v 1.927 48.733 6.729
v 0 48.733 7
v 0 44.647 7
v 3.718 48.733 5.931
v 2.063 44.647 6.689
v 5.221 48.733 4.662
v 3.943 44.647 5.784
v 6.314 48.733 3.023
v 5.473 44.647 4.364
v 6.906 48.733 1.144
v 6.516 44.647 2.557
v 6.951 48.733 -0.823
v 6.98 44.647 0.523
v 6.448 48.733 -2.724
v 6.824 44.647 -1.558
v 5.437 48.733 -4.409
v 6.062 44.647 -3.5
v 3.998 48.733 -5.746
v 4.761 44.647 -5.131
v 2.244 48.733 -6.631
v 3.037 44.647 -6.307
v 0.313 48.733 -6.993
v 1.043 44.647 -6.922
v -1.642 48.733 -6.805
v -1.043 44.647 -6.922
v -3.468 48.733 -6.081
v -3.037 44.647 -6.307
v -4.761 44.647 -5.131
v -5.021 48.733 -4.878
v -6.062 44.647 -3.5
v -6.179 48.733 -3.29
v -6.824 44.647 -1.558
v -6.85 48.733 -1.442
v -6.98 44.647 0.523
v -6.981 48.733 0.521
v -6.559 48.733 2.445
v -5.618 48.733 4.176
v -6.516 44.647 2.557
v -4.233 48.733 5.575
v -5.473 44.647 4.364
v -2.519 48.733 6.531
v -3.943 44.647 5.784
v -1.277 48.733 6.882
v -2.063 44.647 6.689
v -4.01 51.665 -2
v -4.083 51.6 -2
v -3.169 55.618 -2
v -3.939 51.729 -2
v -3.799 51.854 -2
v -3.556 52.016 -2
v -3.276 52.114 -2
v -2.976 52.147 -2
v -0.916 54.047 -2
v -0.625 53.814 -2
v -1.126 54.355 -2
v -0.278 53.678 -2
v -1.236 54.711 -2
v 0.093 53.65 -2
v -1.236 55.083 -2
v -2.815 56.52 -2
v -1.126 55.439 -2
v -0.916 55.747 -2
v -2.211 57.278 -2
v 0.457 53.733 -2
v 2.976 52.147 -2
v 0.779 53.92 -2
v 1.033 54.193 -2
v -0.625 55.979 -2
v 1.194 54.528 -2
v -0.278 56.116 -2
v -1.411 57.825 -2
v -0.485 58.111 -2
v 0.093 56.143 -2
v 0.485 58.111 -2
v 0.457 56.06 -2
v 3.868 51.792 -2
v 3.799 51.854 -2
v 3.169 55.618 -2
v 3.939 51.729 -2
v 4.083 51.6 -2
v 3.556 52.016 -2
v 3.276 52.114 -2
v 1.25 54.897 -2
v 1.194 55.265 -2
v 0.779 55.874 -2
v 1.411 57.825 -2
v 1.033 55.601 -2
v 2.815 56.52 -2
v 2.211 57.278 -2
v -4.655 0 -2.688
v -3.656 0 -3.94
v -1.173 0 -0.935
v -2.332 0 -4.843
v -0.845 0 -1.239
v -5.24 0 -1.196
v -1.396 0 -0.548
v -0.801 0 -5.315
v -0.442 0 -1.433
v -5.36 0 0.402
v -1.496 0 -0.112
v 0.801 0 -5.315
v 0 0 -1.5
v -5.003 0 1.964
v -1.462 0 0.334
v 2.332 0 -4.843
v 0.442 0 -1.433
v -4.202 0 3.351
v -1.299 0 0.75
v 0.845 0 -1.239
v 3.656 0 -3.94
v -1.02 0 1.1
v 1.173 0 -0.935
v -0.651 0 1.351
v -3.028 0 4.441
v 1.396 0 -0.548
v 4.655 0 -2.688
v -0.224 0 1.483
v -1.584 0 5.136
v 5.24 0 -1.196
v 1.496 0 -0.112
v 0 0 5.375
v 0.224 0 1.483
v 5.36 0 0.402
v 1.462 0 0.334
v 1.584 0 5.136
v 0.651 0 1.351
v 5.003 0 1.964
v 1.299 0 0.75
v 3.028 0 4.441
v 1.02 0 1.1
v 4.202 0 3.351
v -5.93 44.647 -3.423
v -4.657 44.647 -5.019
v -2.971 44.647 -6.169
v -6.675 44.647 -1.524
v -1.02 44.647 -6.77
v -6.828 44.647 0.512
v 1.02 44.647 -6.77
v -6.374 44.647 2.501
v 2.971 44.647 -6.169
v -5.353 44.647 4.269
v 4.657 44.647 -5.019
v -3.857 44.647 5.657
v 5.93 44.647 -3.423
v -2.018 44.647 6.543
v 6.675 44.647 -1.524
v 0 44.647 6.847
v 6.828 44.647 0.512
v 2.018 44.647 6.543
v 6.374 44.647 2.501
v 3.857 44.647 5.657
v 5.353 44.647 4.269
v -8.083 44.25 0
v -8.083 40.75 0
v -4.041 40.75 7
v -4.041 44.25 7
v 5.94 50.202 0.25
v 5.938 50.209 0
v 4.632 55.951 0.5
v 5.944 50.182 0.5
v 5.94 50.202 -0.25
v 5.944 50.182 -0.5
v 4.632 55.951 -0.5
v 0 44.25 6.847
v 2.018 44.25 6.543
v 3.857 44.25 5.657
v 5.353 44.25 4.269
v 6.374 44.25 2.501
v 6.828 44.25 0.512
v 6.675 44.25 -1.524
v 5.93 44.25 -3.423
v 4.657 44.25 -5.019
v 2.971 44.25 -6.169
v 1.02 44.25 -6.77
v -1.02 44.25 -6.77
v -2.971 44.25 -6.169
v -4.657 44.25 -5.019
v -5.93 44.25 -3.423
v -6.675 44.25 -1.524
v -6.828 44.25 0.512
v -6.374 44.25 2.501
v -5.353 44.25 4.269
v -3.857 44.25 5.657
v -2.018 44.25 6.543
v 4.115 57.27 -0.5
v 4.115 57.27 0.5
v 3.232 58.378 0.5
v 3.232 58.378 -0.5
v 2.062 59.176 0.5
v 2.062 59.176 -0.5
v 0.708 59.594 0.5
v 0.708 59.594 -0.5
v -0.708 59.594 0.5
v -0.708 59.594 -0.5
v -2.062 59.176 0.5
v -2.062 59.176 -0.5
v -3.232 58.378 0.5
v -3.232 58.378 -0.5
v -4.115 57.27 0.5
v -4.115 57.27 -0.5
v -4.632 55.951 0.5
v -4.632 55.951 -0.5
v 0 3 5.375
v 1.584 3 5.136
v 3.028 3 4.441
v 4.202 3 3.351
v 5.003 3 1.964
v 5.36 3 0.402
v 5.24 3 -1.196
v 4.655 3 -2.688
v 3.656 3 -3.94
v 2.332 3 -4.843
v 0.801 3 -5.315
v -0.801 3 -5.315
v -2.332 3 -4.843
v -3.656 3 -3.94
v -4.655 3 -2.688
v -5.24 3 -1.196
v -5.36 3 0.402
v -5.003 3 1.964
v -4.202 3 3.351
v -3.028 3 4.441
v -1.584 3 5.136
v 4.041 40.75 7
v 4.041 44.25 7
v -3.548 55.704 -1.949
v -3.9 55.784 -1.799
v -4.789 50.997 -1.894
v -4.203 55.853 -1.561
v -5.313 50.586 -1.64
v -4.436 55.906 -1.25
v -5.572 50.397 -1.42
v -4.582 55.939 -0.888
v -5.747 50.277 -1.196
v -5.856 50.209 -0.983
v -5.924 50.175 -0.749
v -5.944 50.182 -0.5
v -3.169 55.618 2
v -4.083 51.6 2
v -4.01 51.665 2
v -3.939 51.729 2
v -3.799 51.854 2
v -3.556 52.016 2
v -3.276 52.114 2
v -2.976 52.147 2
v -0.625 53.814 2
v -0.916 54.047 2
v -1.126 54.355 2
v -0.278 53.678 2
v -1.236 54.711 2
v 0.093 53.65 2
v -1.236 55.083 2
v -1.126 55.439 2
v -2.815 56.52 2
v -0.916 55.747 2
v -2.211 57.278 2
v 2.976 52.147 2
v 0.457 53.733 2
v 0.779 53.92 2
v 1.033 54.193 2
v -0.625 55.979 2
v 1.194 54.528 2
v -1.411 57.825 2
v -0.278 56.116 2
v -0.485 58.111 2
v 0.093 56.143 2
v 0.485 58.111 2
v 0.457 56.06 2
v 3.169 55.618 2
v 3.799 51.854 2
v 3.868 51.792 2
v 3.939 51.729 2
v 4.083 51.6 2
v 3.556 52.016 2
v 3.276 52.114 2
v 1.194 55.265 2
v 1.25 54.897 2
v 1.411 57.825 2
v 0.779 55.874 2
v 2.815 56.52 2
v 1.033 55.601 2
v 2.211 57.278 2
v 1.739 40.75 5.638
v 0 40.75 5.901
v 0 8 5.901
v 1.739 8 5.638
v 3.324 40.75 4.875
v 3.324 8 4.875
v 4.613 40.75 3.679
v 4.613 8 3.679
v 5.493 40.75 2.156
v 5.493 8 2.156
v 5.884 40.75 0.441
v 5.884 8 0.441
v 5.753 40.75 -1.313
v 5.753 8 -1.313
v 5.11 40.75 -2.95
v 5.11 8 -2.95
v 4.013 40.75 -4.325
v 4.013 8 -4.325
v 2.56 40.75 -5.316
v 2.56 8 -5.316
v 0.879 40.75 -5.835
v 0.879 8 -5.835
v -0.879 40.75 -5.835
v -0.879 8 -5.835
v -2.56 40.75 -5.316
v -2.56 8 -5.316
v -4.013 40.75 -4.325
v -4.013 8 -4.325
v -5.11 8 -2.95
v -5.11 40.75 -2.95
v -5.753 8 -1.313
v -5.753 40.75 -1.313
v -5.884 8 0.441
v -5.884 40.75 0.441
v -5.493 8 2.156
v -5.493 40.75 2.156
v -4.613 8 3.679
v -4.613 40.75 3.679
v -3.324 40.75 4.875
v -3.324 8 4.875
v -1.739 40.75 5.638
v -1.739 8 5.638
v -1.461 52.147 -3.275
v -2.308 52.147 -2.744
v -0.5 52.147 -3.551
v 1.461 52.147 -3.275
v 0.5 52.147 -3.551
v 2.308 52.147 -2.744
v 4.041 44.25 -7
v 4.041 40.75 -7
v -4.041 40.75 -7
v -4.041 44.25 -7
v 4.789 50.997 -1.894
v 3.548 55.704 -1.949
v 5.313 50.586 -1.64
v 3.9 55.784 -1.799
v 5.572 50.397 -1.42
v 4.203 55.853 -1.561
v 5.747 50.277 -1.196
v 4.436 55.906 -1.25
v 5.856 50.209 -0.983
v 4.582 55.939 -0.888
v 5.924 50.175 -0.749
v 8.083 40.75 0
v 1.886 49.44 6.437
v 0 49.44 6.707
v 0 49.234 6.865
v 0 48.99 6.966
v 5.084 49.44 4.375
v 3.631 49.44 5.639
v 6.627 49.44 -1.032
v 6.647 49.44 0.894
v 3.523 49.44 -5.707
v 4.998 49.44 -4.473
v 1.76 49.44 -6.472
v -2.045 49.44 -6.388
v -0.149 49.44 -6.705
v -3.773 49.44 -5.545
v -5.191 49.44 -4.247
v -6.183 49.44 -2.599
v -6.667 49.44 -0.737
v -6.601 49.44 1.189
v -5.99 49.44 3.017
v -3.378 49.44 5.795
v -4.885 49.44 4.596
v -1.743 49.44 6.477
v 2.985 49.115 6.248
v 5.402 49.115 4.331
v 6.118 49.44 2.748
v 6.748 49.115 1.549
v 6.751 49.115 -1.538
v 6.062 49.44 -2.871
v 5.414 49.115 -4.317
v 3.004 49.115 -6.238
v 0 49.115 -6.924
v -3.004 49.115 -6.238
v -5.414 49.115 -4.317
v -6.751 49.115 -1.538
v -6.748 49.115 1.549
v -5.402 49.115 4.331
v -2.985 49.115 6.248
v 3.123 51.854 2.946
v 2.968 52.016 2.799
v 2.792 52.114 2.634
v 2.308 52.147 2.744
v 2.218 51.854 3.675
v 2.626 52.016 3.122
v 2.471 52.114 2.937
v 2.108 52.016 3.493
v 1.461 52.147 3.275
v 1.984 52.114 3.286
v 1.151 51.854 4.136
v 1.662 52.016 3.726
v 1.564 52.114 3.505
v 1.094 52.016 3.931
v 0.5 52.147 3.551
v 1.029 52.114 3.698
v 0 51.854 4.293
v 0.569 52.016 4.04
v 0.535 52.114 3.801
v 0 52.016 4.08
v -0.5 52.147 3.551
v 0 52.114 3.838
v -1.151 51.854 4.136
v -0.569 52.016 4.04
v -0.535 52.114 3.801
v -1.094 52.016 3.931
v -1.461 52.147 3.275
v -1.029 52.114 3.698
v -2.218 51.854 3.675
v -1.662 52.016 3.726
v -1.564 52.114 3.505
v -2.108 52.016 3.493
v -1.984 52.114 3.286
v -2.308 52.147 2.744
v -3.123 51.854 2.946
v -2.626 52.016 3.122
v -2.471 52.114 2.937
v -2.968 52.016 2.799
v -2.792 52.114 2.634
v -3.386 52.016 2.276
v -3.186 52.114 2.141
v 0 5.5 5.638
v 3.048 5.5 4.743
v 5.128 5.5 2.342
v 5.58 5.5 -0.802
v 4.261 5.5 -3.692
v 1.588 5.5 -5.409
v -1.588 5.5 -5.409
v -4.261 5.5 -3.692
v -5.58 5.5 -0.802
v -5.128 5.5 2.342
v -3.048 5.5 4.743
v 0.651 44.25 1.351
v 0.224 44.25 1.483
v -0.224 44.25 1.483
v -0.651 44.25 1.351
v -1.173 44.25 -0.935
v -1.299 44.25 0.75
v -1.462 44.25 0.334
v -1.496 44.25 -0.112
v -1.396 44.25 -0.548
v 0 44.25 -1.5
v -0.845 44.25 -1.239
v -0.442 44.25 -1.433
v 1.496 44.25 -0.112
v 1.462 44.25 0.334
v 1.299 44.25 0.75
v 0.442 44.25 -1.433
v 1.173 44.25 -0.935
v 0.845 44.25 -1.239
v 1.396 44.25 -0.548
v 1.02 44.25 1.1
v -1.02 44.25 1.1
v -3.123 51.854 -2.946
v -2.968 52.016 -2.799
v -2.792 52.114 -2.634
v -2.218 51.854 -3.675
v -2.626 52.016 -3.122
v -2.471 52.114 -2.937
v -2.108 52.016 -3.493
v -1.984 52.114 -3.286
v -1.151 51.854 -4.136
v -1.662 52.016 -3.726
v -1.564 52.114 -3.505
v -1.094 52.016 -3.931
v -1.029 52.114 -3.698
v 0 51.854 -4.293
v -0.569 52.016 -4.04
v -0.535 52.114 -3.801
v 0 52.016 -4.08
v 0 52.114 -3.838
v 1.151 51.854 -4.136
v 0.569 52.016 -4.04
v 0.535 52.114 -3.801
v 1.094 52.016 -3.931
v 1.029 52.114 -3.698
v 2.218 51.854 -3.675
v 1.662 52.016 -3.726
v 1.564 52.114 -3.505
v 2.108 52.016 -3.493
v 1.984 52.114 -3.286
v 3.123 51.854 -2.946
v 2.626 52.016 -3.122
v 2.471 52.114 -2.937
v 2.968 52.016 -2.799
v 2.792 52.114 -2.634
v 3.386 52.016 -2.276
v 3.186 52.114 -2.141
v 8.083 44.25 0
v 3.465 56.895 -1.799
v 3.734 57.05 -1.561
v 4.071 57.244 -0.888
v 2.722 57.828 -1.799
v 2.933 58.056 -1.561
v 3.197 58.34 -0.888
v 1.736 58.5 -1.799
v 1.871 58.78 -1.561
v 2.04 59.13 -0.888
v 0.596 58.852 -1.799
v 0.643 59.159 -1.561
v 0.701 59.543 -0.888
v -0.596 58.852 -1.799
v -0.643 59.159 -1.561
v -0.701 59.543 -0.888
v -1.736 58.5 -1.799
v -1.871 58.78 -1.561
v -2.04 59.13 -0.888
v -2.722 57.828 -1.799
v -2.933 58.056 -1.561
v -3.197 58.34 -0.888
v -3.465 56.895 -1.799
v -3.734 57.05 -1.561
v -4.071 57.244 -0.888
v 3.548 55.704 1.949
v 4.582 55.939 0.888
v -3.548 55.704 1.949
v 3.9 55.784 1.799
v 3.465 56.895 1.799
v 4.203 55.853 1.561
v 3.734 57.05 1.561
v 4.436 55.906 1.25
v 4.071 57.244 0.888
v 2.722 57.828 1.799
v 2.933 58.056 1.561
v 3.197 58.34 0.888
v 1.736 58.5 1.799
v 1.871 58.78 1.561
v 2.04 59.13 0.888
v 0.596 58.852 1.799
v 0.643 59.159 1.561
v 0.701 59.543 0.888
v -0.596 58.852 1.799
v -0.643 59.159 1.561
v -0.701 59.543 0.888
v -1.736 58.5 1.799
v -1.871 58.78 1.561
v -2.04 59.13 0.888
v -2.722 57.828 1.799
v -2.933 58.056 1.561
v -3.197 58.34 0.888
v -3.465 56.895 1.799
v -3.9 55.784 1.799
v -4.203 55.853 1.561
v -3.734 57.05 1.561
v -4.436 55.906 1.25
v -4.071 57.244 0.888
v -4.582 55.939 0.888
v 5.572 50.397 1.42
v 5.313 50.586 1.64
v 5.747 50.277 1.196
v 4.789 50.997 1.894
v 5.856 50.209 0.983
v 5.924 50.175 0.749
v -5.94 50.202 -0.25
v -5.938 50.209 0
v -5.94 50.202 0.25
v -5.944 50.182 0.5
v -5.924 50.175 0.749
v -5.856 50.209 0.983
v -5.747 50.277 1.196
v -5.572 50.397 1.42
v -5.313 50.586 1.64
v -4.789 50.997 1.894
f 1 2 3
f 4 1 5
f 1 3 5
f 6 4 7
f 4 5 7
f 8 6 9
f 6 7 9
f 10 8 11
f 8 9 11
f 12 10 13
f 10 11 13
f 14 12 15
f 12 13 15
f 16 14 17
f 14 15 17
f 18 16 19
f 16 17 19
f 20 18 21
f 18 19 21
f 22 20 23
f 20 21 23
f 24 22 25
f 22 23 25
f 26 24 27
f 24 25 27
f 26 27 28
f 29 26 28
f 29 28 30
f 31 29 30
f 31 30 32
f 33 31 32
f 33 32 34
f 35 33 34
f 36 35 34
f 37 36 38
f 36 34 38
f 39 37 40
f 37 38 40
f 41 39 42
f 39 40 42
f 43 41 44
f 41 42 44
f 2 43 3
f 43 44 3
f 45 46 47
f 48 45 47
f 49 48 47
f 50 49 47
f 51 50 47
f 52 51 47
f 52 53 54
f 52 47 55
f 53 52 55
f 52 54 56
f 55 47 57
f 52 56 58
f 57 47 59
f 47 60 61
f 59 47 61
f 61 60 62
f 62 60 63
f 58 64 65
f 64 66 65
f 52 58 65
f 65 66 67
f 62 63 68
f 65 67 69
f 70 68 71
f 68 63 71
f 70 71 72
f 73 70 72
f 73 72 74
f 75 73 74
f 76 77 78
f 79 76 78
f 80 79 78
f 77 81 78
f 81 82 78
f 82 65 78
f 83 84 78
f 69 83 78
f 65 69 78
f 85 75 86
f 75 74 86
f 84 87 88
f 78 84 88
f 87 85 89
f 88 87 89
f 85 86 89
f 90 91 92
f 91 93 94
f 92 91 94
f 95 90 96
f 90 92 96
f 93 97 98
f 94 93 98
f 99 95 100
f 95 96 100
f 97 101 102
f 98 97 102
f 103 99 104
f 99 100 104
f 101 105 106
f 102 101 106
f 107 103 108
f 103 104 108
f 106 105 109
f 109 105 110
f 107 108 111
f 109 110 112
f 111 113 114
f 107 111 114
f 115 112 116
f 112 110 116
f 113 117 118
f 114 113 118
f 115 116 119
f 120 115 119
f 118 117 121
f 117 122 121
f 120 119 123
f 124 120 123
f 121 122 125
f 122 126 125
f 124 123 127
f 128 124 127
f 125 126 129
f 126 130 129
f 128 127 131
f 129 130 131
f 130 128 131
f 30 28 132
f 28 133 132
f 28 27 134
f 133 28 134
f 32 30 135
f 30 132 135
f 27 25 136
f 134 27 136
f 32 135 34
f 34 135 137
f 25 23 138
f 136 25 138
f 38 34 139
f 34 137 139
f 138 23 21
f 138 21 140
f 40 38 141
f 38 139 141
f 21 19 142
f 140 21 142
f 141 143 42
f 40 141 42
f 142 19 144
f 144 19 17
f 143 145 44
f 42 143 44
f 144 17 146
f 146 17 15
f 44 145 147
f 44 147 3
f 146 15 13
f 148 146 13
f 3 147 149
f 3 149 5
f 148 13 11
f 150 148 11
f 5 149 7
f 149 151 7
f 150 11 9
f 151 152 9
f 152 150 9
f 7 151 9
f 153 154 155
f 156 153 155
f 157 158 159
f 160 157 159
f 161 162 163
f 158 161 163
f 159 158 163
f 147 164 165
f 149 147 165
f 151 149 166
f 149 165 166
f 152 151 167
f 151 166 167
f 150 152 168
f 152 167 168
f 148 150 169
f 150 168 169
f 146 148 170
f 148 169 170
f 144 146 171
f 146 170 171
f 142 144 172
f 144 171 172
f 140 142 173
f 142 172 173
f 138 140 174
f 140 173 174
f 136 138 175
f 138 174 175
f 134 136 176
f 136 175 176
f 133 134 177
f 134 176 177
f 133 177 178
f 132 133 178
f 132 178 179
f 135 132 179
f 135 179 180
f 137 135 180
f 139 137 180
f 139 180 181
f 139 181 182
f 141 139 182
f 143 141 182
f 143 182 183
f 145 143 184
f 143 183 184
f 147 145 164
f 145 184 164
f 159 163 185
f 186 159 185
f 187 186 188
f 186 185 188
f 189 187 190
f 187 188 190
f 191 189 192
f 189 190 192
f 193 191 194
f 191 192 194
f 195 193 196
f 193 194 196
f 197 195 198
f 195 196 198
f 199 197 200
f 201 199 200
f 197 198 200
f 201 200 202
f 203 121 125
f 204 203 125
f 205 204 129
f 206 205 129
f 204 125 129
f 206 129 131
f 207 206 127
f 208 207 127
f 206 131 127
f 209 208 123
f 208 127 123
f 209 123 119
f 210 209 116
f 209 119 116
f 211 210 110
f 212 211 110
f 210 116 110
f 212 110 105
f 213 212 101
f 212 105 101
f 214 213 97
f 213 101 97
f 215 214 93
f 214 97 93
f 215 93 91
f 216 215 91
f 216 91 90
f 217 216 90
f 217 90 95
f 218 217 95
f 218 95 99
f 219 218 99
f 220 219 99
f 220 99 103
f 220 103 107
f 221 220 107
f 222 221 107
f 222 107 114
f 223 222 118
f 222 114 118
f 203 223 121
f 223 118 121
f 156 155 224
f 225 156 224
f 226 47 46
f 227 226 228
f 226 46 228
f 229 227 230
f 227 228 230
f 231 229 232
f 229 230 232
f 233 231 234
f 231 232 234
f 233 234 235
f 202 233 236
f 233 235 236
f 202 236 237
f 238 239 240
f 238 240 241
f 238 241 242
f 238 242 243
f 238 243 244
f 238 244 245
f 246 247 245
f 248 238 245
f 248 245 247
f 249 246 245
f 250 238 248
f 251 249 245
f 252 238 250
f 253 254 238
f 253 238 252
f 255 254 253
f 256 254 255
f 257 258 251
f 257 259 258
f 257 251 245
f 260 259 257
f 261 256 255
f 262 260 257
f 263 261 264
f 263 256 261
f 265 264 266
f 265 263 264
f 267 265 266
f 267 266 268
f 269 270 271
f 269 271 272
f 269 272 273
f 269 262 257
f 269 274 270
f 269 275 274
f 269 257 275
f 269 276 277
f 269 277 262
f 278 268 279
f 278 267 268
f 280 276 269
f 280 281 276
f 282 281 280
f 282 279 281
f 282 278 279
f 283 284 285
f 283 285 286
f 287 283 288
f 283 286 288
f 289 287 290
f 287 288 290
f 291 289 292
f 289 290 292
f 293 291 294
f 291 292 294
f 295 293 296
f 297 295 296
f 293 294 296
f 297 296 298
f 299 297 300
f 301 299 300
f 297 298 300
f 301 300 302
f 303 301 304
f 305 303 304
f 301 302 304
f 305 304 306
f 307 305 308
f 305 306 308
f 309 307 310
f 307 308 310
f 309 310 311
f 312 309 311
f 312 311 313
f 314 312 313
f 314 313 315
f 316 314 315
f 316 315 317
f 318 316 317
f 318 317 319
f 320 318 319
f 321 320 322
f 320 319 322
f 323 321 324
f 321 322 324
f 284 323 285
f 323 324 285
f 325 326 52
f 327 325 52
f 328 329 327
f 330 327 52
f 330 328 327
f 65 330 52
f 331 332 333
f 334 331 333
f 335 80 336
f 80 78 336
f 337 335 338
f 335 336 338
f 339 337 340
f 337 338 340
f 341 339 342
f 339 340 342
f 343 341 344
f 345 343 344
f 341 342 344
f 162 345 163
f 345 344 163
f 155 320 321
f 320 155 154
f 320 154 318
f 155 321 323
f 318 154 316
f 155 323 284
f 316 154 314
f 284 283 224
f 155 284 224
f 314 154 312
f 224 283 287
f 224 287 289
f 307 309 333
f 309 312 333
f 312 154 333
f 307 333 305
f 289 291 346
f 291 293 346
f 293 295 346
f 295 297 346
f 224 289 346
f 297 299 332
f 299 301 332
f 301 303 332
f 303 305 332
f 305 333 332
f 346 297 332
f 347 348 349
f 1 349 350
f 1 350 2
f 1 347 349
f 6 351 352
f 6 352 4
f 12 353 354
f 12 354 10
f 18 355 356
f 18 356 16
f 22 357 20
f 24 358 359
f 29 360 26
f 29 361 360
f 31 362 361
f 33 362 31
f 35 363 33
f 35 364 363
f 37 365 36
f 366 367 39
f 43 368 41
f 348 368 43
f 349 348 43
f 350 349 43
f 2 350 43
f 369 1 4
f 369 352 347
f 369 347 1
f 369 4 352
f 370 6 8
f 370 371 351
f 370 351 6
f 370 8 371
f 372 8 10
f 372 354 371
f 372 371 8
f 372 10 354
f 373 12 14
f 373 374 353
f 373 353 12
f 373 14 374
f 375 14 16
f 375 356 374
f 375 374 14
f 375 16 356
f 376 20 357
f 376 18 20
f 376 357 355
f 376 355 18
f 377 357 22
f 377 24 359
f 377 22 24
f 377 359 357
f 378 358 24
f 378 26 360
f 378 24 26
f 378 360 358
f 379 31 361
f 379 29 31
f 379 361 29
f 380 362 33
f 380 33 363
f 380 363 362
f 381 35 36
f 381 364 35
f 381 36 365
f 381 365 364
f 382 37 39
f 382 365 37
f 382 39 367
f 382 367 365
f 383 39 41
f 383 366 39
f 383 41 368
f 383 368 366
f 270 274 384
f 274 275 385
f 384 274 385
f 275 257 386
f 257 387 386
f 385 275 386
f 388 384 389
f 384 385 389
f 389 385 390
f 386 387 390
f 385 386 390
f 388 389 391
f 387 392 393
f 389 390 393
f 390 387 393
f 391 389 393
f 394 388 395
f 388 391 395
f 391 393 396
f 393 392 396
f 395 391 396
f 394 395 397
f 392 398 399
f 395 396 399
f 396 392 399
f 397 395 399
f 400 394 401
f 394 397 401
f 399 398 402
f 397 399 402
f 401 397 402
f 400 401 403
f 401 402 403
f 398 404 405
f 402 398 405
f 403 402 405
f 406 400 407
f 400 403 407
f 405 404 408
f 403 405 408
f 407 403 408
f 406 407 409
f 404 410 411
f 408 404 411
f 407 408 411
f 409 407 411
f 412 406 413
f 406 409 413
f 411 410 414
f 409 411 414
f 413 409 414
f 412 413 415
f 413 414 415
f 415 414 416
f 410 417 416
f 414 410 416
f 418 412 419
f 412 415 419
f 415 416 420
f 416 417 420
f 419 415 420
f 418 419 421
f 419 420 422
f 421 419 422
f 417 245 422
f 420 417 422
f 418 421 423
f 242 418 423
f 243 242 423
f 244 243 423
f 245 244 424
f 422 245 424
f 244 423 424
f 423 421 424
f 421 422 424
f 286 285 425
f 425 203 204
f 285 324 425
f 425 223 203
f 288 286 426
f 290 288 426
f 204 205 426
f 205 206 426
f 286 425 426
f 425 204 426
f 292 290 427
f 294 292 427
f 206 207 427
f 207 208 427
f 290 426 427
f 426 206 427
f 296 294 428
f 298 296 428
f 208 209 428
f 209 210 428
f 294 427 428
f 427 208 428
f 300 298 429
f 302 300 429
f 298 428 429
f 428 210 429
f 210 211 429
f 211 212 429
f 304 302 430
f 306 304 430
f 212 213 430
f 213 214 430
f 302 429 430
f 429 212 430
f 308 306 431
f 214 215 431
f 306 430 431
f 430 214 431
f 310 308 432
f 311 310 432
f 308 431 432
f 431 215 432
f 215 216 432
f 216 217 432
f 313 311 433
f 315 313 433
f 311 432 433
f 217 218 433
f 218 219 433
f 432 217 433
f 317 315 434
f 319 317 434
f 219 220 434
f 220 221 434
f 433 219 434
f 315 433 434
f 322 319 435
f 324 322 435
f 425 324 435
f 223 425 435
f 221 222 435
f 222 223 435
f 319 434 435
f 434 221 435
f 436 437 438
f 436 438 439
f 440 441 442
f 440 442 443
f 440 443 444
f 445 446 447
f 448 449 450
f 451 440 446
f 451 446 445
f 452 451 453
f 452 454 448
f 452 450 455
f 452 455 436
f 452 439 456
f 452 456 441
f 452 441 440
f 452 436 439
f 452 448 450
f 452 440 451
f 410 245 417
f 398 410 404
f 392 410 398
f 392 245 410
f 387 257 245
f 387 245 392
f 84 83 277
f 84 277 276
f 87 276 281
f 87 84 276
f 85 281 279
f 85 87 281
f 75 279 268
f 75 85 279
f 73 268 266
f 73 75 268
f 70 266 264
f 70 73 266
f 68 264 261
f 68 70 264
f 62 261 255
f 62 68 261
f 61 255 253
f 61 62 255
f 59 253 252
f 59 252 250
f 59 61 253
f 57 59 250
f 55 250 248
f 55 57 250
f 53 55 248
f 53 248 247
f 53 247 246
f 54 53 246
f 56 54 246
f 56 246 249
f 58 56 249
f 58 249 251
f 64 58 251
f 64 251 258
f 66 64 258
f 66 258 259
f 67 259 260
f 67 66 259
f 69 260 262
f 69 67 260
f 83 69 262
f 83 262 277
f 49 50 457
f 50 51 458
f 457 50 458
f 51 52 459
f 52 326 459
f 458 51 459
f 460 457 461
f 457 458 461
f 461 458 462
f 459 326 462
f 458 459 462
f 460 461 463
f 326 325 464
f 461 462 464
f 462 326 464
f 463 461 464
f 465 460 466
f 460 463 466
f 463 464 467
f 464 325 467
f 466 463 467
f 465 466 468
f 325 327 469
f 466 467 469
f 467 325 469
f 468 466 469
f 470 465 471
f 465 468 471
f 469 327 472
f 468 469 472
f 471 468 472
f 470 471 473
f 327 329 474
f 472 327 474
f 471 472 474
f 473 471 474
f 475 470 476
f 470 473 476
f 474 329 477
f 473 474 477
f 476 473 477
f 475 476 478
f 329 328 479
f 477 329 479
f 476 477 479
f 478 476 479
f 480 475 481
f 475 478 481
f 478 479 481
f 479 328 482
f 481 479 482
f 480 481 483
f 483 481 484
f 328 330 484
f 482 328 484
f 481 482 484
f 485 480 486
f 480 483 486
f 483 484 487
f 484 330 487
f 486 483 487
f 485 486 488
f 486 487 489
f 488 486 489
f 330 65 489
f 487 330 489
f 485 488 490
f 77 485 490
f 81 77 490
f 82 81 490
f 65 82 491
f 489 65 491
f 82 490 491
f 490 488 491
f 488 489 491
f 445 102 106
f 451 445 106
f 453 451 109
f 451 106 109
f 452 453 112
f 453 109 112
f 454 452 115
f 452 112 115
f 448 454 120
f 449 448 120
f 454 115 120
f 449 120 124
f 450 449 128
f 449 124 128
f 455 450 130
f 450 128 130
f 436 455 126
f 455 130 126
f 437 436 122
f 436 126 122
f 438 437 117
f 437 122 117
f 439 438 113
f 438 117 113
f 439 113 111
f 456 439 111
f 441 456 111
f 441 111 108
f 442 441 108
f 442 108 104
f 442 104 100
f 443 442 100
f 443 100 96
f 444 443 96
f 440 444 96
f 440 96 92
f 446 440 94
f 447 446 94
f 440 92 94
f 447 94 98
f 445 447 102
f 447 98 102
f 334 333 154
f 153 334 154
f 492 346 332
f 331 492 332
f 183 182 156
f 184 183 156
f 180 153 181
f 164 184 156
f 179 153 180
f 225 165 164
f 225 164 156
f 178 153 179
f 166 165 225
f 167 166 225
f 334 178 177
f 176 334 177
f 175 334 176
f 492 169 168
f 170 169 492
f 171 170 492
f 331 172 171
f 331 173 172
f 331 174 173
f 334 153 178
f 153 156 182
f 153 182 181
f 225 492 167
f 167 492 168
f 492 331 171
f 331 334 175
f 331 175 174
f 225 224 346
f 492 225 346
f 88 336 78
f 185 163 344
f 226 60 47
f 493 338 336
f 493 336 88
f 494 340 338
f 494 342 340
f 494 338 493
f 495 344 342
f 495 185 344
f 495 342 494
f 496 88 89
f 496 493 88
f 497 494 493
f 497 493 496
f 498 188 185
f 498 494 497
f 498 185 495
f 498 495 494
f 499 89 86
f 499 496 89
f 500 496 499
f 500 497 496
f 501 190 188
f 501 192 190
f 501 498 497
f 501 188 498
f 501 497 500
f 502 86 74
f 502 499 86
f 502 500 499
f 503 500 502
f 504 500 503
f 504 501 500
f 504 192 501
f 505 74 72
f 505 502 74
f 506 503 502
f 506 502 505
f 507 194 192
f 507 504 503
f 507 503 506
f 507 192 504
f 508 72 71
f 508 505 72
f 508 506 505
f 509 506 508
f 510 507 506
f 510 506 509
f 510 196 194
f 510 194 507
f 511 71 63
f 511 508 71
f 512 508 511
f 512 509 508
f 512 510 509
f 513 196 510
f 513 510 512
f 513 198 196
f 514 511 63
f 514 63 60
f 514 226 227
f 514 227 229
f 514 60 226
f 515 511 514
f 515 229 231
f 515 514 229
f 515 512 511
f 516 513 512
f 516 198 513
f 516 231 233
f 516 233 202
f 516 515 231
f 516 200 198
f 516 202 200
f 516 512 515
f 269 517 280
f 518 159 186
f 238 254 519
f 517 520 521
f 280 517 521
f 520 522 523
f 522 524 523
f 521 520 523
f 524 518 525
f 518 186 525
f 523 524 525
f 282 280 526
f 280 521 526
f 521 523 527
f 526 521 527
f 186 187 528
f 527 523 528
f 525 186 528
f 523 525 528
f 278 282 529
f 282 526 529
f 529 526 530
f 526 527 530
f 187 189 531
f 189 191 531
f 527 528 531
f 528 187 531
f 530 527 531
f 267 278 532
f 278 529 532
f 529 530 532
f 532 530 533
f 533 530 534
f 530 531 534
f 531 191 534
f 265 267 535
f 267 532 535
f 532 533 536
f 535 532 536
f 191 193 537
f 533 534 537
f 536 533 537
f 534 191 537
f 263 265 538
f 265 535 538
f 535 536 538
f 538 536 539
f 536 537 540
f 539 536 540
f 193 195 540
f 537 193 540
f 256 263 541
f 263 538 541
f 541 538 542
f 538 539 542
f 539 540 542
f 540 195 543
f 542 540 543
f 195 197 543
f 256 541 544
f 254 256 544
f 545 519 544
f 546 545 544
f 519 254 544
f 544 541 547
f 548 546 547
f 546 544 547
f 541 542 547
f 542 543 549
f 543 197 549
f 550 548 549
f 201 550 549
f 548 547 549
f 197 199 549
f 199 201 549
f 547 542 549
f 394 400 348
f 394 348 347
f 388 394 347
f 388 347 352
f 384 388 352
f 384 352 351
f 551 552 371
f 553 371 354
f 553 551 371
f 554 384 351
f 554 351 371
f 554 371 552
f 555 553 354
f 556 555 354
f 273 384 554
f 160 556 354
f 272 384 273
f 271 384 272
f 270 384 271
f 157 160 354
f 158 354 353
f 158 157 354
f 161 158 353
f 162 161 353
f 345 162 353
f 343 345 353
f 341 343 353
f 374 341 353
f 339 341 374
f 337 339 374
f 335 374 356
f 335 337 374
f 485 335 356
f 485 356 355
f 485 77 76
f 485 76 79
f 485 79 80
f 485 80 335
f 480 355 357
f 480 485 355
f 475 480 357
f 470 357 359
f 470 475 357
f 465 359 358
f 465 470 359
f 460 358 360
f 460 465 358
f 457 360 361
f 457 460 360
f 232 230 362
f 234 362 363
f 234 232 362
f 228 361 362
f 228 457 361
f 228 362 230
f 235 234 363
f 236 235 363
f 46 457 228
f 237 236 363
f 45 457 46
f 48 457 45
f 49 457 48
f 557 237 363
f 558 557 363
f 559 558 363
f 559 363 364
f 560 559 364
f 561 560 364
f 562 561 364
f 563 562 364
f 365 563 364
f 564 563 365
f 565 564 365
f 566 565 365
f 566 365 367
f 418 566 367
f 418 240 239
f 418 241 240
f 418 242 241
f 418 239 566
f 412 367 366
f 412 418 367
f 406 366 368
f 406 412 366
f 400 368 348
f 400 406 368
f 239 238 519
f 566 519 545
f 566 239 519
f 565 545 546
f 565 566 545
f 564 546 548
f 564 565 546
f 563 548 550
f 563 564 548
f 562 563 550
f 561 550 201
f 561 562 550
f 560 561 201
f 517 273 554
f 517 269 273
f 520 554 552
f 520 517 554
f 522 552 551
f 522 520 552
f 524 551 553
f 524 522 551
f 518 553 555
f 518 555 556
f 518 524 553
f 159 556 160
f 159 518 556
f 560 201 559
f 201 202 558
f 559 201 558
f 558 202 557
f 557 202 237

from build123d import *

# Parameters (mm, degrees)
SKETCH1_R                = 5.375
BOSS_EXTRUDE1_DEPTH      = 3
SKETCH2_R                = 5.375
BOSS_EXTRUDE2_DEPTH      = 5
BOSS_EXTRUDE2_DRAFT      = -6
SKETCH3_R                = 5.900521176
BOSS_EXTRUDE3_DEPTH      = 32.75
BOSS_EXTRUDE4_DEPTH      = 3.5
SKETCH6_R                = 6.846847864
BOSS_EXTRUDE5_DEPTH      = 0.396875
SKETCH7_R                = 7
BOSS_EXTRUDE6_DEPTH      = 4.5
SKETCH8_R                = 7
BOSS_EXTRUDE7_DEPTH      = 3
BOSS_EXTRUDE7_TAPER      = 45
BOSS_EXTRUDE8_DEPTH      = 2
BOSS_EXTRUDE8_DEPTH_BACK = 2
SKETCH9_R                = 4.75
SKETCH9_R_2              = 1.25
FILLET1_R                = 1
FILLET2_R                = 1.5
SKETCH10_R               = 1.5
CUT_EXTRUDE1_DEPTH       = 44.25


with BuildPart() as part:
    # Sketch1 → Boss-Extrude1 (new body)
    with BuildSketch(Plane(origin=(0, 0, 0), x_dir=(1, 0, 0), z_dir=(0, 1, 0))):
        with Locations(Location((0, 0, 0), (0, 0, 270))):
            Circle(SKETCH1_R)
    extrude(amount=BOSS_EXTRUDE1_DEPTH)


with BuildPart() as boss_extrude2_tool:
    # Sketch2 → Boss-Extrude2 (with draft: the straight prism first)
    with BuildSketch(Plane(origin=(0, 3, 0), x_dir=(1, 0, 0), z_dir=(0, 1, 0))):
        with Locations(Location((0, 0, 0), (0, 0, 270))):
            Circle(SKETCH2_R)
    extrude(amount=BOSS_EXTRUDE2_DEPTH)
    # Boss-Extrude2: the draft: its side faces are tilted about the plane it starts from
    boss_extrude2_sides = [boss_extrude2_tool.faces().sort_by_distance(p)[0] for p in [
        (0, 5.5, -5.375),
    ]]
    draft(boss_extrude2_sides, Plane(origin=(0, 3, 0), x_dir=(1, 0, 0), z_dir=(0, 1, 0)), BOSS_EXTRUDE2_DRAFT)


with BuildPart() as part_1:
    add(part.part)

    # Boss-Extrude2: add boss_extrude2_tool
    add(boss_extrude2_tool.part)

    # Sketch3 → Boss-Extrude3 (add)
    with BuildSketch(Plane(origin=(0, 8, 0), x_dir=(1, 0, 0), z_dir=(0, 1, 0))):
        with Locations(Location((0, 0, 0), (0, 0, 270))):
            Circle(SKETCH3_R)
    extrude(amount=BOSS_EXTRUDE3_DEPTH)

    # Sketch5 → Boss-Extrude4 (add)
    with BuildSketch(Plane(origin=(0, 40.75, 0), x_dir=(1, 0, 0), z_dir=(0, 1, 0))):
        Polygon((-4.041451884, 7), (-8.082903769, 0), (-4.041451884, -7), (4.041451884, -7), (8.082903769, 0), (4.041451884, 7), align=None)
    extrude(amount=BOSS_EXTRUDE4_DEPTH)

    # Sketch6 → Boss-Extrude5 (add)
    with BuildSketch(Plane(origin=(0, 44.25, 0), x_dir=(1, 0, 0), z_dir=(0, 1, 0))):
        with Locations(Location((0, 0, 0), (0, 0, 270))):
            Circle(SKETCH6_R)
    extrude(amount=BOSS_EXTRUDE5_DEPTH)

    # Sketch7 → Boss-Extrude6 (add)
    with BuildSketch(Plane(origin=(0, 44.646875, 0), x_dir=(1, 0, 0), z_dir=(0, 1, 0))):
        with Locations(Location((0, 0, 0), (0, 0, 270))):
            Circle(SKETCH7_R)
    extrude(amount=BOSS_EXTRUDE6_DEPTH)

    # Sketch8 → Boss-Extrude7 (add)
    with BuildSketch(Plane(origin=(0, 49.146875, 0), x_dir=(1, 0, 0), z_dir=(0, 1, 0))):
        with Locations(Location((0, 0, 0), (0, 0, 270))):
            Circle(SKETCH8_R)
    extrude(amount=BOSS_EXTRUDE7_DEPTH, taper=BOSS_EXTRUDE7_TAPER)

    # Sketch9 → Boss-Extrude8 (add, two sides: drawn at the far end of the back side and taken through both)
    # profile 1 of 2: a face of its own
    with BuildSketch(Plane.XY.offset(-BOSS_EXTRUDE8_DEPTH_BACK)):
        with Locations((0, 54.896875)):
            Circle(SKETCH9_R)
        with Locations((0, 54.896875)):
            Circle(SKETCH9_R_2, mode=Mode.SUBTRACT)
    # profile 2 of 2: a face of its own
    with BuildSketch(Plane.XY.offset(-BOSS_EXTRUDE8_DEPTH_BACK)):
        with BuildLine():
            Line((6.179622496, 49.146875), (4.631634766, 55.950658372))
            ThreePointArc((4.631634766, 55.950658372), (4.72031594, 55.427080084), (4.75, 54.896875))
            ThreePointArc((4.75, 54.896875), (-0.530205084, 50.17655906), (-4.631634766, 55.950658372))
            Line((-4.631634766, 55.950658372), (-6.179622496, 49.146875))
            Line((-6.179622496, 49.146875), (6.179622496, 49.146875))
        make_face()
    extrude(amount=BOSS_EXTRUDE8_DEPTH + BOSS_EXTRUDE8_DEPTH_BACK)

    # Fillet1
    fillet1_edges = [part_1.edges().sort_by_distance(p)[0] for p in [
        (2, 52.146875, 3.464101615),
        (0, 49.146875, -7),
        (0, 52.146875, -4),
    ]]
    fillet(fillet1_edges, radius=FILLET1_R)

    # Fillet2
    fillet2_edges = [part_1.edges().sort_by_distance(p)[0] for p in [
        (-5.332362658, 52.870788493, -2),
        (0, 59.646875, -2),
        (-5.332362658, 52.870788493, 2),
        (0, 59.646875, 2),
        (5.332362658, 52.870788493, -2),
        (5.332362658, 52.870788493, 2),
    ]]
    fillet(fillet2_edges, radius=FILLET2_R)

    # Sketch10 → Cut-Extrude1 (cut)
    with BuildSketch(Plane.XZ):
        with Locations(Location((0, 0, 0), (0, 0, 270))):
            Circle(SKETCH10_R)
    extrude(amount=-CUT_EXTRUDE1_DEPTH, mode=Mode.SUBTRACT)


solid = part_1.part
